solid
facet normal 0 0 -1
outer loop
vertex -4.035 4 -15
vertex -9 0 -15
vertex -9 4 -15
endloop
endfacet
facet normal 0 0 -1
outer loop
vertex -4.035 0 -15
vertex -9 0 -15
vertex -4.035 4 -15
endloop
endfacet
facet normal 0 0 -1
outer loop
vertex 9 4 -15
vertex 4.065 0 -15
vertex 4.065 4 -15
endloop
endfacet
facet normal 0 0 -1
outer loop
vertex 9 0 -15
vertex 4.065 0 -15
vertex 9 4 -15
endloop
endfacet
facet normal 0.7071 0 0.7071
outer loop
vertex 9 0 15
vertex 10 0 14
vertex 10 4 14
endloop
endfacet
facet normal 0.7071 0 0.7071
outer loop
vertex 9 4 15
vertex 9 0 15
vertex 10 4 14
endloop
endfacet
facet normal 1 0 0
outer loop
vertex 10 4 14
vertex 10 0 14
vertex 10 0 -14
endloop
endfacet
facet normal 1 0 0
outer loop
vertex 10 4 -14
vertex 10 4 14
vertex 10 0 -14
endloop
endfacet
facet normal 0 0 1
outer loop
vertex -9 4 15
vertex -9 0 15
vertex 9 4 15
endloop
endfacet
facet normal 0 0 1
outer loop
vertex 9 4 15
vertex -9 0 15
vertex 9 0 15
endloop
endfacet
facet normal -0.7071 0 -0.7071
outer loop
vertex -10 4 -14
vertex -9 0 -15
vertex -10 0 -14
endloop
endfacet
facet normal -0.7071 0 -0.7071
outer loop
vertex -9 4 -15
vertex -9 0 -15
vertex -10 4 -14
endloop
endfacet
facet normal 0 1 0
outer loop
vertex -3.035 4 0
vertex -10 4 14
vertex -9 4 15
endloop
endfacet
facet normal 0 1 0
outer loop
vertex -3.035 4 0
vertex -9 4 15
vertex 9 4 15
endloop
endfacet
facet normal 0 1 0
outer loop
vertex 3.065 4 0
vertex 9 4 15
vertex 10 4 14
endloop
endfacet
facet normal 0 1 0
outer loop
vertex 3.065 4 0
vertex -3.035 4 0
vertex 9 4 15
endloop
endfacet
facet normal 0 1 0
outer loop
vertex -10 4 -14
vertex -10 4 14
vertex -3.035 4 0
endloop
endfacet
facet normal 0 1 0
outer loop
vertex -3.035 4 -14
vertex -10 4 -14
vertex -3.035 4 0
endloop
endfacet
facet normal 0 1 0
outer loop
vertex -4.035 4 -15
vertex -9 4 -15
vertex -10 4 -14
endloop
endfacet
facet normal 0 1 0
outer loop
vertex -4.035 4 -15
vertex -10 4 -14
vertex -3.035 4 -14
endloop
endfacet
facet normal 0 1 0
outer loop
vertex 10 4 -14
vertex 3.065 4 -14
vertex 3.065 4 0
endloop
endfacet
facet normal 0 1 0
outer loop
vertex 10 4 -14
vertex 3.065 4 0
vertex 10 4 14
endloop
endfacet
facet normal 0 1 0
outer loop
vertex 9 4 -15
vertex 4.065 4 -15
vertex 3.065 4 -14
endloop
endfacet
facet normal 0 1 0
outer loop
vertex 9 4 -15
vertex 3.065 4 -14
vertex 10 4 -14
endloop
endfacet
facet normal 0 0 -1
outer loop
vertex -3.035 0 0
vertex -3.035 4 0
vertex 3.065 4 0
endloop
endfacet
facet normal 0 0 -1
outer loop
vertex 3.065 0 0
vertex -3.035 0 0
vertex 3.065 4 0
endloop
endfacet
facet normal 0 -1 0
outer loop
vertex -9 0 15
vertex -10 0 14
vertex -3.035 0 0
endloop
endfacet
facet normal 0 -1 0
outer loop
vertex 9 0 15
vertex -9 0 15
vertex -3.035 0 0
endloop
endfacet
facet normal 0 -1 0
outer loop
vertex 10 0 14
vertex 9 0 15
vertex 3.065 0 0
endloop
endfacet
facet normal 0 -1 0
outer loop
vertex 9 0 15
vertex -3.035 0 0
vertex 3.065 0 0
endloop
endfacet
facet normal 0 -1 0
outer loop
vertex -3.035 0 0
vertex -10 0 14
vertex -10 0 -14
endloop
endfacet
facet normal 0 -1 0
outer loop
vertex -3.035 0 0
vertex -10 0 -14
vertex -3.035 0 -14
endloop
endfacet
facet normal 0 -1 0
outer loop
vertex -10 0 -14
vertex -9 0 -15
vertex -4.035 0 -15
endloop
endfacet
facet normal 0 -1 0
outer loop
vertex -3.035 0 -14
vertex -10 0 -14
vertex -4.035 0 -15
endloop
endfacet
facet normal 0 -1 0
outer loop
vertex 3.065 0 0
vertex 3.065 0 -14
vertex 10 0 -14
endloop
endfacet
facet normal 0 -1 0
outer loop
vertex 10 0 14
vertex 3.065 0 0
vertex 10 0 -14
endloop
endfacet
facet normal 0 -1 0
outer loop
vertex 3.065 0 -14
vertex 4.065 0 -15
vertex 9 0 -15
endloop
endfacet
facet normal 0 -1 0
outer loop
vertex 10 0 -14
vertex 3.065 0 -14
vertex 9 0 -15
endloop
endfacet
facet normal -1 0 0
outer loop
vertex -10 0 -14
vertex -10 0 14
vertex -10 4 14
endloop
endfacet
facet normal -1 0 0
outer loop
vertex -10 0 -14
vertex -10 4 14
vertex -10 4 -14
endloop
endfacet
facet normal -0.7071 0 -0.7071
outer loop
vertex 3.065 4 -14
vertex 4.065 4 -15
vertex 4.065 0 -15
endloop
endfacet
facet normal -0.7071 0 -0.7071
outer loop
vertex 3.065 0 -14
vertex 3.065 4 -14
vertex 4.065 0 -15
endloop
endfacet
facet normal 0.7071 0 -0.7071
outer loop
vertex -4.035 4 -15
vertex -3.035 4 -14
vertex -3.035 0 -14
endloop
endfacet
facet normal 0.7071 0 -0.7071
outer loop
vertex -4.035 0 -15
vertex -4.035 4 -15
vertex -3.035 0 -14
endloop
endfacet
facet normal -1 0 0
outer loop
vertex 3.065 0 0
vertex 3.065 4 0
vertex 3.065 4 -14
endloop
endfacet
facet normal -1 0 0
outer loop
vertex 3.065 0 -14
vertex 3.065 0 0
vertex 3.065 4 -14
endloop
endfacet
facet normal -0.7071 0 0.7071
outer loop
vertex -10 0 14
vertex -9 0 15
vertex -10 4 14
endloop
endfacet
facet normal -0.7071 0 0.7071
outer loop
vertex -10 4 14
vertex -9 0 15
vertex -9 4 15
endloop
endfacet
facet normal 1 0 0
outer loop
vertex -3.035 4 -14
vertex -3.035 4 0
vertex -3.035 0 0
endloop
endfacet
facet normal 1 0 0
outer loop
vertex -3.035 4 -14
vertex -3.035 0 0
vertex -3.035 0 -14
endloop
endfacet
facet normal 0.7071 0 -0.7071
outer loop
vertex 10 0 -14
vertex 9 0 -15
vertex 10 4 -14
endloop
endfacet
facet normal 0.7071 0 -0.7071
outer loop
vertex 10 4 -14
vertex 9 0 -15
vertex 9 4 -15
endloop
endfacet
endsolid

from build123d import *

# Parameters (mm, degrees)
SKIZZE1_W                       = 20
SKIZZE1_H                       = 30
AUFSATZ_LINEAR_AUSTRAGEN1_DEPTH = 4
SKIZZE2_W                       = 6.1
SKIZZE2_H                       = 15
SCHNITT_LINEAR_AUSTRAGEN1_DEPTH = 5
FASE1_SIZE                      = 1


with BuildPart() as part:
    # Skizze1 → Aufsatz-Linear austragen1 (new body)
    with BuildSketch(Plane(origin=(0, 0, 0), x_dir=(1, 0, 0), z_dir=(0, 1, 0))):
        Rectangle(SKIZZE1_W, SKIZZE1_H)
    extrude(amount=AUFSATZ_LINEAR_AUSTRAGEN1_DEPTH)

    # Skizze2 → Schnitt-Linear austragen1 (cut, through all)
    with BuildSketch(Plane(origin=(0, 4, 0), x_dir=(1, 0, 0), z_dir=(0, 1, 0))):
        with Locations((0.014627906, 7.5)):
            Rectangle(SKIZZE2_W, SKIZZE2_H)
    extrude(amount=-SCHNITT_LINEAR_AUSTRAGEN1_DEPTH, mode=Mode.SUBTRACT)

    # Fase1
    fase1_edges = [part.edges().sort_by_distance(p)[0] for p in [
        (-3.035372094, 2, -15),
        (3.064627906, 2, -15),
        (10, 2, 15),
        (-10, 2, 15),
        (-10, 2, -15),
        (10, 2, -15),
    ]]
    chamfer(fase1_edges, length=FASE1_SIZE)


solid = part.part
